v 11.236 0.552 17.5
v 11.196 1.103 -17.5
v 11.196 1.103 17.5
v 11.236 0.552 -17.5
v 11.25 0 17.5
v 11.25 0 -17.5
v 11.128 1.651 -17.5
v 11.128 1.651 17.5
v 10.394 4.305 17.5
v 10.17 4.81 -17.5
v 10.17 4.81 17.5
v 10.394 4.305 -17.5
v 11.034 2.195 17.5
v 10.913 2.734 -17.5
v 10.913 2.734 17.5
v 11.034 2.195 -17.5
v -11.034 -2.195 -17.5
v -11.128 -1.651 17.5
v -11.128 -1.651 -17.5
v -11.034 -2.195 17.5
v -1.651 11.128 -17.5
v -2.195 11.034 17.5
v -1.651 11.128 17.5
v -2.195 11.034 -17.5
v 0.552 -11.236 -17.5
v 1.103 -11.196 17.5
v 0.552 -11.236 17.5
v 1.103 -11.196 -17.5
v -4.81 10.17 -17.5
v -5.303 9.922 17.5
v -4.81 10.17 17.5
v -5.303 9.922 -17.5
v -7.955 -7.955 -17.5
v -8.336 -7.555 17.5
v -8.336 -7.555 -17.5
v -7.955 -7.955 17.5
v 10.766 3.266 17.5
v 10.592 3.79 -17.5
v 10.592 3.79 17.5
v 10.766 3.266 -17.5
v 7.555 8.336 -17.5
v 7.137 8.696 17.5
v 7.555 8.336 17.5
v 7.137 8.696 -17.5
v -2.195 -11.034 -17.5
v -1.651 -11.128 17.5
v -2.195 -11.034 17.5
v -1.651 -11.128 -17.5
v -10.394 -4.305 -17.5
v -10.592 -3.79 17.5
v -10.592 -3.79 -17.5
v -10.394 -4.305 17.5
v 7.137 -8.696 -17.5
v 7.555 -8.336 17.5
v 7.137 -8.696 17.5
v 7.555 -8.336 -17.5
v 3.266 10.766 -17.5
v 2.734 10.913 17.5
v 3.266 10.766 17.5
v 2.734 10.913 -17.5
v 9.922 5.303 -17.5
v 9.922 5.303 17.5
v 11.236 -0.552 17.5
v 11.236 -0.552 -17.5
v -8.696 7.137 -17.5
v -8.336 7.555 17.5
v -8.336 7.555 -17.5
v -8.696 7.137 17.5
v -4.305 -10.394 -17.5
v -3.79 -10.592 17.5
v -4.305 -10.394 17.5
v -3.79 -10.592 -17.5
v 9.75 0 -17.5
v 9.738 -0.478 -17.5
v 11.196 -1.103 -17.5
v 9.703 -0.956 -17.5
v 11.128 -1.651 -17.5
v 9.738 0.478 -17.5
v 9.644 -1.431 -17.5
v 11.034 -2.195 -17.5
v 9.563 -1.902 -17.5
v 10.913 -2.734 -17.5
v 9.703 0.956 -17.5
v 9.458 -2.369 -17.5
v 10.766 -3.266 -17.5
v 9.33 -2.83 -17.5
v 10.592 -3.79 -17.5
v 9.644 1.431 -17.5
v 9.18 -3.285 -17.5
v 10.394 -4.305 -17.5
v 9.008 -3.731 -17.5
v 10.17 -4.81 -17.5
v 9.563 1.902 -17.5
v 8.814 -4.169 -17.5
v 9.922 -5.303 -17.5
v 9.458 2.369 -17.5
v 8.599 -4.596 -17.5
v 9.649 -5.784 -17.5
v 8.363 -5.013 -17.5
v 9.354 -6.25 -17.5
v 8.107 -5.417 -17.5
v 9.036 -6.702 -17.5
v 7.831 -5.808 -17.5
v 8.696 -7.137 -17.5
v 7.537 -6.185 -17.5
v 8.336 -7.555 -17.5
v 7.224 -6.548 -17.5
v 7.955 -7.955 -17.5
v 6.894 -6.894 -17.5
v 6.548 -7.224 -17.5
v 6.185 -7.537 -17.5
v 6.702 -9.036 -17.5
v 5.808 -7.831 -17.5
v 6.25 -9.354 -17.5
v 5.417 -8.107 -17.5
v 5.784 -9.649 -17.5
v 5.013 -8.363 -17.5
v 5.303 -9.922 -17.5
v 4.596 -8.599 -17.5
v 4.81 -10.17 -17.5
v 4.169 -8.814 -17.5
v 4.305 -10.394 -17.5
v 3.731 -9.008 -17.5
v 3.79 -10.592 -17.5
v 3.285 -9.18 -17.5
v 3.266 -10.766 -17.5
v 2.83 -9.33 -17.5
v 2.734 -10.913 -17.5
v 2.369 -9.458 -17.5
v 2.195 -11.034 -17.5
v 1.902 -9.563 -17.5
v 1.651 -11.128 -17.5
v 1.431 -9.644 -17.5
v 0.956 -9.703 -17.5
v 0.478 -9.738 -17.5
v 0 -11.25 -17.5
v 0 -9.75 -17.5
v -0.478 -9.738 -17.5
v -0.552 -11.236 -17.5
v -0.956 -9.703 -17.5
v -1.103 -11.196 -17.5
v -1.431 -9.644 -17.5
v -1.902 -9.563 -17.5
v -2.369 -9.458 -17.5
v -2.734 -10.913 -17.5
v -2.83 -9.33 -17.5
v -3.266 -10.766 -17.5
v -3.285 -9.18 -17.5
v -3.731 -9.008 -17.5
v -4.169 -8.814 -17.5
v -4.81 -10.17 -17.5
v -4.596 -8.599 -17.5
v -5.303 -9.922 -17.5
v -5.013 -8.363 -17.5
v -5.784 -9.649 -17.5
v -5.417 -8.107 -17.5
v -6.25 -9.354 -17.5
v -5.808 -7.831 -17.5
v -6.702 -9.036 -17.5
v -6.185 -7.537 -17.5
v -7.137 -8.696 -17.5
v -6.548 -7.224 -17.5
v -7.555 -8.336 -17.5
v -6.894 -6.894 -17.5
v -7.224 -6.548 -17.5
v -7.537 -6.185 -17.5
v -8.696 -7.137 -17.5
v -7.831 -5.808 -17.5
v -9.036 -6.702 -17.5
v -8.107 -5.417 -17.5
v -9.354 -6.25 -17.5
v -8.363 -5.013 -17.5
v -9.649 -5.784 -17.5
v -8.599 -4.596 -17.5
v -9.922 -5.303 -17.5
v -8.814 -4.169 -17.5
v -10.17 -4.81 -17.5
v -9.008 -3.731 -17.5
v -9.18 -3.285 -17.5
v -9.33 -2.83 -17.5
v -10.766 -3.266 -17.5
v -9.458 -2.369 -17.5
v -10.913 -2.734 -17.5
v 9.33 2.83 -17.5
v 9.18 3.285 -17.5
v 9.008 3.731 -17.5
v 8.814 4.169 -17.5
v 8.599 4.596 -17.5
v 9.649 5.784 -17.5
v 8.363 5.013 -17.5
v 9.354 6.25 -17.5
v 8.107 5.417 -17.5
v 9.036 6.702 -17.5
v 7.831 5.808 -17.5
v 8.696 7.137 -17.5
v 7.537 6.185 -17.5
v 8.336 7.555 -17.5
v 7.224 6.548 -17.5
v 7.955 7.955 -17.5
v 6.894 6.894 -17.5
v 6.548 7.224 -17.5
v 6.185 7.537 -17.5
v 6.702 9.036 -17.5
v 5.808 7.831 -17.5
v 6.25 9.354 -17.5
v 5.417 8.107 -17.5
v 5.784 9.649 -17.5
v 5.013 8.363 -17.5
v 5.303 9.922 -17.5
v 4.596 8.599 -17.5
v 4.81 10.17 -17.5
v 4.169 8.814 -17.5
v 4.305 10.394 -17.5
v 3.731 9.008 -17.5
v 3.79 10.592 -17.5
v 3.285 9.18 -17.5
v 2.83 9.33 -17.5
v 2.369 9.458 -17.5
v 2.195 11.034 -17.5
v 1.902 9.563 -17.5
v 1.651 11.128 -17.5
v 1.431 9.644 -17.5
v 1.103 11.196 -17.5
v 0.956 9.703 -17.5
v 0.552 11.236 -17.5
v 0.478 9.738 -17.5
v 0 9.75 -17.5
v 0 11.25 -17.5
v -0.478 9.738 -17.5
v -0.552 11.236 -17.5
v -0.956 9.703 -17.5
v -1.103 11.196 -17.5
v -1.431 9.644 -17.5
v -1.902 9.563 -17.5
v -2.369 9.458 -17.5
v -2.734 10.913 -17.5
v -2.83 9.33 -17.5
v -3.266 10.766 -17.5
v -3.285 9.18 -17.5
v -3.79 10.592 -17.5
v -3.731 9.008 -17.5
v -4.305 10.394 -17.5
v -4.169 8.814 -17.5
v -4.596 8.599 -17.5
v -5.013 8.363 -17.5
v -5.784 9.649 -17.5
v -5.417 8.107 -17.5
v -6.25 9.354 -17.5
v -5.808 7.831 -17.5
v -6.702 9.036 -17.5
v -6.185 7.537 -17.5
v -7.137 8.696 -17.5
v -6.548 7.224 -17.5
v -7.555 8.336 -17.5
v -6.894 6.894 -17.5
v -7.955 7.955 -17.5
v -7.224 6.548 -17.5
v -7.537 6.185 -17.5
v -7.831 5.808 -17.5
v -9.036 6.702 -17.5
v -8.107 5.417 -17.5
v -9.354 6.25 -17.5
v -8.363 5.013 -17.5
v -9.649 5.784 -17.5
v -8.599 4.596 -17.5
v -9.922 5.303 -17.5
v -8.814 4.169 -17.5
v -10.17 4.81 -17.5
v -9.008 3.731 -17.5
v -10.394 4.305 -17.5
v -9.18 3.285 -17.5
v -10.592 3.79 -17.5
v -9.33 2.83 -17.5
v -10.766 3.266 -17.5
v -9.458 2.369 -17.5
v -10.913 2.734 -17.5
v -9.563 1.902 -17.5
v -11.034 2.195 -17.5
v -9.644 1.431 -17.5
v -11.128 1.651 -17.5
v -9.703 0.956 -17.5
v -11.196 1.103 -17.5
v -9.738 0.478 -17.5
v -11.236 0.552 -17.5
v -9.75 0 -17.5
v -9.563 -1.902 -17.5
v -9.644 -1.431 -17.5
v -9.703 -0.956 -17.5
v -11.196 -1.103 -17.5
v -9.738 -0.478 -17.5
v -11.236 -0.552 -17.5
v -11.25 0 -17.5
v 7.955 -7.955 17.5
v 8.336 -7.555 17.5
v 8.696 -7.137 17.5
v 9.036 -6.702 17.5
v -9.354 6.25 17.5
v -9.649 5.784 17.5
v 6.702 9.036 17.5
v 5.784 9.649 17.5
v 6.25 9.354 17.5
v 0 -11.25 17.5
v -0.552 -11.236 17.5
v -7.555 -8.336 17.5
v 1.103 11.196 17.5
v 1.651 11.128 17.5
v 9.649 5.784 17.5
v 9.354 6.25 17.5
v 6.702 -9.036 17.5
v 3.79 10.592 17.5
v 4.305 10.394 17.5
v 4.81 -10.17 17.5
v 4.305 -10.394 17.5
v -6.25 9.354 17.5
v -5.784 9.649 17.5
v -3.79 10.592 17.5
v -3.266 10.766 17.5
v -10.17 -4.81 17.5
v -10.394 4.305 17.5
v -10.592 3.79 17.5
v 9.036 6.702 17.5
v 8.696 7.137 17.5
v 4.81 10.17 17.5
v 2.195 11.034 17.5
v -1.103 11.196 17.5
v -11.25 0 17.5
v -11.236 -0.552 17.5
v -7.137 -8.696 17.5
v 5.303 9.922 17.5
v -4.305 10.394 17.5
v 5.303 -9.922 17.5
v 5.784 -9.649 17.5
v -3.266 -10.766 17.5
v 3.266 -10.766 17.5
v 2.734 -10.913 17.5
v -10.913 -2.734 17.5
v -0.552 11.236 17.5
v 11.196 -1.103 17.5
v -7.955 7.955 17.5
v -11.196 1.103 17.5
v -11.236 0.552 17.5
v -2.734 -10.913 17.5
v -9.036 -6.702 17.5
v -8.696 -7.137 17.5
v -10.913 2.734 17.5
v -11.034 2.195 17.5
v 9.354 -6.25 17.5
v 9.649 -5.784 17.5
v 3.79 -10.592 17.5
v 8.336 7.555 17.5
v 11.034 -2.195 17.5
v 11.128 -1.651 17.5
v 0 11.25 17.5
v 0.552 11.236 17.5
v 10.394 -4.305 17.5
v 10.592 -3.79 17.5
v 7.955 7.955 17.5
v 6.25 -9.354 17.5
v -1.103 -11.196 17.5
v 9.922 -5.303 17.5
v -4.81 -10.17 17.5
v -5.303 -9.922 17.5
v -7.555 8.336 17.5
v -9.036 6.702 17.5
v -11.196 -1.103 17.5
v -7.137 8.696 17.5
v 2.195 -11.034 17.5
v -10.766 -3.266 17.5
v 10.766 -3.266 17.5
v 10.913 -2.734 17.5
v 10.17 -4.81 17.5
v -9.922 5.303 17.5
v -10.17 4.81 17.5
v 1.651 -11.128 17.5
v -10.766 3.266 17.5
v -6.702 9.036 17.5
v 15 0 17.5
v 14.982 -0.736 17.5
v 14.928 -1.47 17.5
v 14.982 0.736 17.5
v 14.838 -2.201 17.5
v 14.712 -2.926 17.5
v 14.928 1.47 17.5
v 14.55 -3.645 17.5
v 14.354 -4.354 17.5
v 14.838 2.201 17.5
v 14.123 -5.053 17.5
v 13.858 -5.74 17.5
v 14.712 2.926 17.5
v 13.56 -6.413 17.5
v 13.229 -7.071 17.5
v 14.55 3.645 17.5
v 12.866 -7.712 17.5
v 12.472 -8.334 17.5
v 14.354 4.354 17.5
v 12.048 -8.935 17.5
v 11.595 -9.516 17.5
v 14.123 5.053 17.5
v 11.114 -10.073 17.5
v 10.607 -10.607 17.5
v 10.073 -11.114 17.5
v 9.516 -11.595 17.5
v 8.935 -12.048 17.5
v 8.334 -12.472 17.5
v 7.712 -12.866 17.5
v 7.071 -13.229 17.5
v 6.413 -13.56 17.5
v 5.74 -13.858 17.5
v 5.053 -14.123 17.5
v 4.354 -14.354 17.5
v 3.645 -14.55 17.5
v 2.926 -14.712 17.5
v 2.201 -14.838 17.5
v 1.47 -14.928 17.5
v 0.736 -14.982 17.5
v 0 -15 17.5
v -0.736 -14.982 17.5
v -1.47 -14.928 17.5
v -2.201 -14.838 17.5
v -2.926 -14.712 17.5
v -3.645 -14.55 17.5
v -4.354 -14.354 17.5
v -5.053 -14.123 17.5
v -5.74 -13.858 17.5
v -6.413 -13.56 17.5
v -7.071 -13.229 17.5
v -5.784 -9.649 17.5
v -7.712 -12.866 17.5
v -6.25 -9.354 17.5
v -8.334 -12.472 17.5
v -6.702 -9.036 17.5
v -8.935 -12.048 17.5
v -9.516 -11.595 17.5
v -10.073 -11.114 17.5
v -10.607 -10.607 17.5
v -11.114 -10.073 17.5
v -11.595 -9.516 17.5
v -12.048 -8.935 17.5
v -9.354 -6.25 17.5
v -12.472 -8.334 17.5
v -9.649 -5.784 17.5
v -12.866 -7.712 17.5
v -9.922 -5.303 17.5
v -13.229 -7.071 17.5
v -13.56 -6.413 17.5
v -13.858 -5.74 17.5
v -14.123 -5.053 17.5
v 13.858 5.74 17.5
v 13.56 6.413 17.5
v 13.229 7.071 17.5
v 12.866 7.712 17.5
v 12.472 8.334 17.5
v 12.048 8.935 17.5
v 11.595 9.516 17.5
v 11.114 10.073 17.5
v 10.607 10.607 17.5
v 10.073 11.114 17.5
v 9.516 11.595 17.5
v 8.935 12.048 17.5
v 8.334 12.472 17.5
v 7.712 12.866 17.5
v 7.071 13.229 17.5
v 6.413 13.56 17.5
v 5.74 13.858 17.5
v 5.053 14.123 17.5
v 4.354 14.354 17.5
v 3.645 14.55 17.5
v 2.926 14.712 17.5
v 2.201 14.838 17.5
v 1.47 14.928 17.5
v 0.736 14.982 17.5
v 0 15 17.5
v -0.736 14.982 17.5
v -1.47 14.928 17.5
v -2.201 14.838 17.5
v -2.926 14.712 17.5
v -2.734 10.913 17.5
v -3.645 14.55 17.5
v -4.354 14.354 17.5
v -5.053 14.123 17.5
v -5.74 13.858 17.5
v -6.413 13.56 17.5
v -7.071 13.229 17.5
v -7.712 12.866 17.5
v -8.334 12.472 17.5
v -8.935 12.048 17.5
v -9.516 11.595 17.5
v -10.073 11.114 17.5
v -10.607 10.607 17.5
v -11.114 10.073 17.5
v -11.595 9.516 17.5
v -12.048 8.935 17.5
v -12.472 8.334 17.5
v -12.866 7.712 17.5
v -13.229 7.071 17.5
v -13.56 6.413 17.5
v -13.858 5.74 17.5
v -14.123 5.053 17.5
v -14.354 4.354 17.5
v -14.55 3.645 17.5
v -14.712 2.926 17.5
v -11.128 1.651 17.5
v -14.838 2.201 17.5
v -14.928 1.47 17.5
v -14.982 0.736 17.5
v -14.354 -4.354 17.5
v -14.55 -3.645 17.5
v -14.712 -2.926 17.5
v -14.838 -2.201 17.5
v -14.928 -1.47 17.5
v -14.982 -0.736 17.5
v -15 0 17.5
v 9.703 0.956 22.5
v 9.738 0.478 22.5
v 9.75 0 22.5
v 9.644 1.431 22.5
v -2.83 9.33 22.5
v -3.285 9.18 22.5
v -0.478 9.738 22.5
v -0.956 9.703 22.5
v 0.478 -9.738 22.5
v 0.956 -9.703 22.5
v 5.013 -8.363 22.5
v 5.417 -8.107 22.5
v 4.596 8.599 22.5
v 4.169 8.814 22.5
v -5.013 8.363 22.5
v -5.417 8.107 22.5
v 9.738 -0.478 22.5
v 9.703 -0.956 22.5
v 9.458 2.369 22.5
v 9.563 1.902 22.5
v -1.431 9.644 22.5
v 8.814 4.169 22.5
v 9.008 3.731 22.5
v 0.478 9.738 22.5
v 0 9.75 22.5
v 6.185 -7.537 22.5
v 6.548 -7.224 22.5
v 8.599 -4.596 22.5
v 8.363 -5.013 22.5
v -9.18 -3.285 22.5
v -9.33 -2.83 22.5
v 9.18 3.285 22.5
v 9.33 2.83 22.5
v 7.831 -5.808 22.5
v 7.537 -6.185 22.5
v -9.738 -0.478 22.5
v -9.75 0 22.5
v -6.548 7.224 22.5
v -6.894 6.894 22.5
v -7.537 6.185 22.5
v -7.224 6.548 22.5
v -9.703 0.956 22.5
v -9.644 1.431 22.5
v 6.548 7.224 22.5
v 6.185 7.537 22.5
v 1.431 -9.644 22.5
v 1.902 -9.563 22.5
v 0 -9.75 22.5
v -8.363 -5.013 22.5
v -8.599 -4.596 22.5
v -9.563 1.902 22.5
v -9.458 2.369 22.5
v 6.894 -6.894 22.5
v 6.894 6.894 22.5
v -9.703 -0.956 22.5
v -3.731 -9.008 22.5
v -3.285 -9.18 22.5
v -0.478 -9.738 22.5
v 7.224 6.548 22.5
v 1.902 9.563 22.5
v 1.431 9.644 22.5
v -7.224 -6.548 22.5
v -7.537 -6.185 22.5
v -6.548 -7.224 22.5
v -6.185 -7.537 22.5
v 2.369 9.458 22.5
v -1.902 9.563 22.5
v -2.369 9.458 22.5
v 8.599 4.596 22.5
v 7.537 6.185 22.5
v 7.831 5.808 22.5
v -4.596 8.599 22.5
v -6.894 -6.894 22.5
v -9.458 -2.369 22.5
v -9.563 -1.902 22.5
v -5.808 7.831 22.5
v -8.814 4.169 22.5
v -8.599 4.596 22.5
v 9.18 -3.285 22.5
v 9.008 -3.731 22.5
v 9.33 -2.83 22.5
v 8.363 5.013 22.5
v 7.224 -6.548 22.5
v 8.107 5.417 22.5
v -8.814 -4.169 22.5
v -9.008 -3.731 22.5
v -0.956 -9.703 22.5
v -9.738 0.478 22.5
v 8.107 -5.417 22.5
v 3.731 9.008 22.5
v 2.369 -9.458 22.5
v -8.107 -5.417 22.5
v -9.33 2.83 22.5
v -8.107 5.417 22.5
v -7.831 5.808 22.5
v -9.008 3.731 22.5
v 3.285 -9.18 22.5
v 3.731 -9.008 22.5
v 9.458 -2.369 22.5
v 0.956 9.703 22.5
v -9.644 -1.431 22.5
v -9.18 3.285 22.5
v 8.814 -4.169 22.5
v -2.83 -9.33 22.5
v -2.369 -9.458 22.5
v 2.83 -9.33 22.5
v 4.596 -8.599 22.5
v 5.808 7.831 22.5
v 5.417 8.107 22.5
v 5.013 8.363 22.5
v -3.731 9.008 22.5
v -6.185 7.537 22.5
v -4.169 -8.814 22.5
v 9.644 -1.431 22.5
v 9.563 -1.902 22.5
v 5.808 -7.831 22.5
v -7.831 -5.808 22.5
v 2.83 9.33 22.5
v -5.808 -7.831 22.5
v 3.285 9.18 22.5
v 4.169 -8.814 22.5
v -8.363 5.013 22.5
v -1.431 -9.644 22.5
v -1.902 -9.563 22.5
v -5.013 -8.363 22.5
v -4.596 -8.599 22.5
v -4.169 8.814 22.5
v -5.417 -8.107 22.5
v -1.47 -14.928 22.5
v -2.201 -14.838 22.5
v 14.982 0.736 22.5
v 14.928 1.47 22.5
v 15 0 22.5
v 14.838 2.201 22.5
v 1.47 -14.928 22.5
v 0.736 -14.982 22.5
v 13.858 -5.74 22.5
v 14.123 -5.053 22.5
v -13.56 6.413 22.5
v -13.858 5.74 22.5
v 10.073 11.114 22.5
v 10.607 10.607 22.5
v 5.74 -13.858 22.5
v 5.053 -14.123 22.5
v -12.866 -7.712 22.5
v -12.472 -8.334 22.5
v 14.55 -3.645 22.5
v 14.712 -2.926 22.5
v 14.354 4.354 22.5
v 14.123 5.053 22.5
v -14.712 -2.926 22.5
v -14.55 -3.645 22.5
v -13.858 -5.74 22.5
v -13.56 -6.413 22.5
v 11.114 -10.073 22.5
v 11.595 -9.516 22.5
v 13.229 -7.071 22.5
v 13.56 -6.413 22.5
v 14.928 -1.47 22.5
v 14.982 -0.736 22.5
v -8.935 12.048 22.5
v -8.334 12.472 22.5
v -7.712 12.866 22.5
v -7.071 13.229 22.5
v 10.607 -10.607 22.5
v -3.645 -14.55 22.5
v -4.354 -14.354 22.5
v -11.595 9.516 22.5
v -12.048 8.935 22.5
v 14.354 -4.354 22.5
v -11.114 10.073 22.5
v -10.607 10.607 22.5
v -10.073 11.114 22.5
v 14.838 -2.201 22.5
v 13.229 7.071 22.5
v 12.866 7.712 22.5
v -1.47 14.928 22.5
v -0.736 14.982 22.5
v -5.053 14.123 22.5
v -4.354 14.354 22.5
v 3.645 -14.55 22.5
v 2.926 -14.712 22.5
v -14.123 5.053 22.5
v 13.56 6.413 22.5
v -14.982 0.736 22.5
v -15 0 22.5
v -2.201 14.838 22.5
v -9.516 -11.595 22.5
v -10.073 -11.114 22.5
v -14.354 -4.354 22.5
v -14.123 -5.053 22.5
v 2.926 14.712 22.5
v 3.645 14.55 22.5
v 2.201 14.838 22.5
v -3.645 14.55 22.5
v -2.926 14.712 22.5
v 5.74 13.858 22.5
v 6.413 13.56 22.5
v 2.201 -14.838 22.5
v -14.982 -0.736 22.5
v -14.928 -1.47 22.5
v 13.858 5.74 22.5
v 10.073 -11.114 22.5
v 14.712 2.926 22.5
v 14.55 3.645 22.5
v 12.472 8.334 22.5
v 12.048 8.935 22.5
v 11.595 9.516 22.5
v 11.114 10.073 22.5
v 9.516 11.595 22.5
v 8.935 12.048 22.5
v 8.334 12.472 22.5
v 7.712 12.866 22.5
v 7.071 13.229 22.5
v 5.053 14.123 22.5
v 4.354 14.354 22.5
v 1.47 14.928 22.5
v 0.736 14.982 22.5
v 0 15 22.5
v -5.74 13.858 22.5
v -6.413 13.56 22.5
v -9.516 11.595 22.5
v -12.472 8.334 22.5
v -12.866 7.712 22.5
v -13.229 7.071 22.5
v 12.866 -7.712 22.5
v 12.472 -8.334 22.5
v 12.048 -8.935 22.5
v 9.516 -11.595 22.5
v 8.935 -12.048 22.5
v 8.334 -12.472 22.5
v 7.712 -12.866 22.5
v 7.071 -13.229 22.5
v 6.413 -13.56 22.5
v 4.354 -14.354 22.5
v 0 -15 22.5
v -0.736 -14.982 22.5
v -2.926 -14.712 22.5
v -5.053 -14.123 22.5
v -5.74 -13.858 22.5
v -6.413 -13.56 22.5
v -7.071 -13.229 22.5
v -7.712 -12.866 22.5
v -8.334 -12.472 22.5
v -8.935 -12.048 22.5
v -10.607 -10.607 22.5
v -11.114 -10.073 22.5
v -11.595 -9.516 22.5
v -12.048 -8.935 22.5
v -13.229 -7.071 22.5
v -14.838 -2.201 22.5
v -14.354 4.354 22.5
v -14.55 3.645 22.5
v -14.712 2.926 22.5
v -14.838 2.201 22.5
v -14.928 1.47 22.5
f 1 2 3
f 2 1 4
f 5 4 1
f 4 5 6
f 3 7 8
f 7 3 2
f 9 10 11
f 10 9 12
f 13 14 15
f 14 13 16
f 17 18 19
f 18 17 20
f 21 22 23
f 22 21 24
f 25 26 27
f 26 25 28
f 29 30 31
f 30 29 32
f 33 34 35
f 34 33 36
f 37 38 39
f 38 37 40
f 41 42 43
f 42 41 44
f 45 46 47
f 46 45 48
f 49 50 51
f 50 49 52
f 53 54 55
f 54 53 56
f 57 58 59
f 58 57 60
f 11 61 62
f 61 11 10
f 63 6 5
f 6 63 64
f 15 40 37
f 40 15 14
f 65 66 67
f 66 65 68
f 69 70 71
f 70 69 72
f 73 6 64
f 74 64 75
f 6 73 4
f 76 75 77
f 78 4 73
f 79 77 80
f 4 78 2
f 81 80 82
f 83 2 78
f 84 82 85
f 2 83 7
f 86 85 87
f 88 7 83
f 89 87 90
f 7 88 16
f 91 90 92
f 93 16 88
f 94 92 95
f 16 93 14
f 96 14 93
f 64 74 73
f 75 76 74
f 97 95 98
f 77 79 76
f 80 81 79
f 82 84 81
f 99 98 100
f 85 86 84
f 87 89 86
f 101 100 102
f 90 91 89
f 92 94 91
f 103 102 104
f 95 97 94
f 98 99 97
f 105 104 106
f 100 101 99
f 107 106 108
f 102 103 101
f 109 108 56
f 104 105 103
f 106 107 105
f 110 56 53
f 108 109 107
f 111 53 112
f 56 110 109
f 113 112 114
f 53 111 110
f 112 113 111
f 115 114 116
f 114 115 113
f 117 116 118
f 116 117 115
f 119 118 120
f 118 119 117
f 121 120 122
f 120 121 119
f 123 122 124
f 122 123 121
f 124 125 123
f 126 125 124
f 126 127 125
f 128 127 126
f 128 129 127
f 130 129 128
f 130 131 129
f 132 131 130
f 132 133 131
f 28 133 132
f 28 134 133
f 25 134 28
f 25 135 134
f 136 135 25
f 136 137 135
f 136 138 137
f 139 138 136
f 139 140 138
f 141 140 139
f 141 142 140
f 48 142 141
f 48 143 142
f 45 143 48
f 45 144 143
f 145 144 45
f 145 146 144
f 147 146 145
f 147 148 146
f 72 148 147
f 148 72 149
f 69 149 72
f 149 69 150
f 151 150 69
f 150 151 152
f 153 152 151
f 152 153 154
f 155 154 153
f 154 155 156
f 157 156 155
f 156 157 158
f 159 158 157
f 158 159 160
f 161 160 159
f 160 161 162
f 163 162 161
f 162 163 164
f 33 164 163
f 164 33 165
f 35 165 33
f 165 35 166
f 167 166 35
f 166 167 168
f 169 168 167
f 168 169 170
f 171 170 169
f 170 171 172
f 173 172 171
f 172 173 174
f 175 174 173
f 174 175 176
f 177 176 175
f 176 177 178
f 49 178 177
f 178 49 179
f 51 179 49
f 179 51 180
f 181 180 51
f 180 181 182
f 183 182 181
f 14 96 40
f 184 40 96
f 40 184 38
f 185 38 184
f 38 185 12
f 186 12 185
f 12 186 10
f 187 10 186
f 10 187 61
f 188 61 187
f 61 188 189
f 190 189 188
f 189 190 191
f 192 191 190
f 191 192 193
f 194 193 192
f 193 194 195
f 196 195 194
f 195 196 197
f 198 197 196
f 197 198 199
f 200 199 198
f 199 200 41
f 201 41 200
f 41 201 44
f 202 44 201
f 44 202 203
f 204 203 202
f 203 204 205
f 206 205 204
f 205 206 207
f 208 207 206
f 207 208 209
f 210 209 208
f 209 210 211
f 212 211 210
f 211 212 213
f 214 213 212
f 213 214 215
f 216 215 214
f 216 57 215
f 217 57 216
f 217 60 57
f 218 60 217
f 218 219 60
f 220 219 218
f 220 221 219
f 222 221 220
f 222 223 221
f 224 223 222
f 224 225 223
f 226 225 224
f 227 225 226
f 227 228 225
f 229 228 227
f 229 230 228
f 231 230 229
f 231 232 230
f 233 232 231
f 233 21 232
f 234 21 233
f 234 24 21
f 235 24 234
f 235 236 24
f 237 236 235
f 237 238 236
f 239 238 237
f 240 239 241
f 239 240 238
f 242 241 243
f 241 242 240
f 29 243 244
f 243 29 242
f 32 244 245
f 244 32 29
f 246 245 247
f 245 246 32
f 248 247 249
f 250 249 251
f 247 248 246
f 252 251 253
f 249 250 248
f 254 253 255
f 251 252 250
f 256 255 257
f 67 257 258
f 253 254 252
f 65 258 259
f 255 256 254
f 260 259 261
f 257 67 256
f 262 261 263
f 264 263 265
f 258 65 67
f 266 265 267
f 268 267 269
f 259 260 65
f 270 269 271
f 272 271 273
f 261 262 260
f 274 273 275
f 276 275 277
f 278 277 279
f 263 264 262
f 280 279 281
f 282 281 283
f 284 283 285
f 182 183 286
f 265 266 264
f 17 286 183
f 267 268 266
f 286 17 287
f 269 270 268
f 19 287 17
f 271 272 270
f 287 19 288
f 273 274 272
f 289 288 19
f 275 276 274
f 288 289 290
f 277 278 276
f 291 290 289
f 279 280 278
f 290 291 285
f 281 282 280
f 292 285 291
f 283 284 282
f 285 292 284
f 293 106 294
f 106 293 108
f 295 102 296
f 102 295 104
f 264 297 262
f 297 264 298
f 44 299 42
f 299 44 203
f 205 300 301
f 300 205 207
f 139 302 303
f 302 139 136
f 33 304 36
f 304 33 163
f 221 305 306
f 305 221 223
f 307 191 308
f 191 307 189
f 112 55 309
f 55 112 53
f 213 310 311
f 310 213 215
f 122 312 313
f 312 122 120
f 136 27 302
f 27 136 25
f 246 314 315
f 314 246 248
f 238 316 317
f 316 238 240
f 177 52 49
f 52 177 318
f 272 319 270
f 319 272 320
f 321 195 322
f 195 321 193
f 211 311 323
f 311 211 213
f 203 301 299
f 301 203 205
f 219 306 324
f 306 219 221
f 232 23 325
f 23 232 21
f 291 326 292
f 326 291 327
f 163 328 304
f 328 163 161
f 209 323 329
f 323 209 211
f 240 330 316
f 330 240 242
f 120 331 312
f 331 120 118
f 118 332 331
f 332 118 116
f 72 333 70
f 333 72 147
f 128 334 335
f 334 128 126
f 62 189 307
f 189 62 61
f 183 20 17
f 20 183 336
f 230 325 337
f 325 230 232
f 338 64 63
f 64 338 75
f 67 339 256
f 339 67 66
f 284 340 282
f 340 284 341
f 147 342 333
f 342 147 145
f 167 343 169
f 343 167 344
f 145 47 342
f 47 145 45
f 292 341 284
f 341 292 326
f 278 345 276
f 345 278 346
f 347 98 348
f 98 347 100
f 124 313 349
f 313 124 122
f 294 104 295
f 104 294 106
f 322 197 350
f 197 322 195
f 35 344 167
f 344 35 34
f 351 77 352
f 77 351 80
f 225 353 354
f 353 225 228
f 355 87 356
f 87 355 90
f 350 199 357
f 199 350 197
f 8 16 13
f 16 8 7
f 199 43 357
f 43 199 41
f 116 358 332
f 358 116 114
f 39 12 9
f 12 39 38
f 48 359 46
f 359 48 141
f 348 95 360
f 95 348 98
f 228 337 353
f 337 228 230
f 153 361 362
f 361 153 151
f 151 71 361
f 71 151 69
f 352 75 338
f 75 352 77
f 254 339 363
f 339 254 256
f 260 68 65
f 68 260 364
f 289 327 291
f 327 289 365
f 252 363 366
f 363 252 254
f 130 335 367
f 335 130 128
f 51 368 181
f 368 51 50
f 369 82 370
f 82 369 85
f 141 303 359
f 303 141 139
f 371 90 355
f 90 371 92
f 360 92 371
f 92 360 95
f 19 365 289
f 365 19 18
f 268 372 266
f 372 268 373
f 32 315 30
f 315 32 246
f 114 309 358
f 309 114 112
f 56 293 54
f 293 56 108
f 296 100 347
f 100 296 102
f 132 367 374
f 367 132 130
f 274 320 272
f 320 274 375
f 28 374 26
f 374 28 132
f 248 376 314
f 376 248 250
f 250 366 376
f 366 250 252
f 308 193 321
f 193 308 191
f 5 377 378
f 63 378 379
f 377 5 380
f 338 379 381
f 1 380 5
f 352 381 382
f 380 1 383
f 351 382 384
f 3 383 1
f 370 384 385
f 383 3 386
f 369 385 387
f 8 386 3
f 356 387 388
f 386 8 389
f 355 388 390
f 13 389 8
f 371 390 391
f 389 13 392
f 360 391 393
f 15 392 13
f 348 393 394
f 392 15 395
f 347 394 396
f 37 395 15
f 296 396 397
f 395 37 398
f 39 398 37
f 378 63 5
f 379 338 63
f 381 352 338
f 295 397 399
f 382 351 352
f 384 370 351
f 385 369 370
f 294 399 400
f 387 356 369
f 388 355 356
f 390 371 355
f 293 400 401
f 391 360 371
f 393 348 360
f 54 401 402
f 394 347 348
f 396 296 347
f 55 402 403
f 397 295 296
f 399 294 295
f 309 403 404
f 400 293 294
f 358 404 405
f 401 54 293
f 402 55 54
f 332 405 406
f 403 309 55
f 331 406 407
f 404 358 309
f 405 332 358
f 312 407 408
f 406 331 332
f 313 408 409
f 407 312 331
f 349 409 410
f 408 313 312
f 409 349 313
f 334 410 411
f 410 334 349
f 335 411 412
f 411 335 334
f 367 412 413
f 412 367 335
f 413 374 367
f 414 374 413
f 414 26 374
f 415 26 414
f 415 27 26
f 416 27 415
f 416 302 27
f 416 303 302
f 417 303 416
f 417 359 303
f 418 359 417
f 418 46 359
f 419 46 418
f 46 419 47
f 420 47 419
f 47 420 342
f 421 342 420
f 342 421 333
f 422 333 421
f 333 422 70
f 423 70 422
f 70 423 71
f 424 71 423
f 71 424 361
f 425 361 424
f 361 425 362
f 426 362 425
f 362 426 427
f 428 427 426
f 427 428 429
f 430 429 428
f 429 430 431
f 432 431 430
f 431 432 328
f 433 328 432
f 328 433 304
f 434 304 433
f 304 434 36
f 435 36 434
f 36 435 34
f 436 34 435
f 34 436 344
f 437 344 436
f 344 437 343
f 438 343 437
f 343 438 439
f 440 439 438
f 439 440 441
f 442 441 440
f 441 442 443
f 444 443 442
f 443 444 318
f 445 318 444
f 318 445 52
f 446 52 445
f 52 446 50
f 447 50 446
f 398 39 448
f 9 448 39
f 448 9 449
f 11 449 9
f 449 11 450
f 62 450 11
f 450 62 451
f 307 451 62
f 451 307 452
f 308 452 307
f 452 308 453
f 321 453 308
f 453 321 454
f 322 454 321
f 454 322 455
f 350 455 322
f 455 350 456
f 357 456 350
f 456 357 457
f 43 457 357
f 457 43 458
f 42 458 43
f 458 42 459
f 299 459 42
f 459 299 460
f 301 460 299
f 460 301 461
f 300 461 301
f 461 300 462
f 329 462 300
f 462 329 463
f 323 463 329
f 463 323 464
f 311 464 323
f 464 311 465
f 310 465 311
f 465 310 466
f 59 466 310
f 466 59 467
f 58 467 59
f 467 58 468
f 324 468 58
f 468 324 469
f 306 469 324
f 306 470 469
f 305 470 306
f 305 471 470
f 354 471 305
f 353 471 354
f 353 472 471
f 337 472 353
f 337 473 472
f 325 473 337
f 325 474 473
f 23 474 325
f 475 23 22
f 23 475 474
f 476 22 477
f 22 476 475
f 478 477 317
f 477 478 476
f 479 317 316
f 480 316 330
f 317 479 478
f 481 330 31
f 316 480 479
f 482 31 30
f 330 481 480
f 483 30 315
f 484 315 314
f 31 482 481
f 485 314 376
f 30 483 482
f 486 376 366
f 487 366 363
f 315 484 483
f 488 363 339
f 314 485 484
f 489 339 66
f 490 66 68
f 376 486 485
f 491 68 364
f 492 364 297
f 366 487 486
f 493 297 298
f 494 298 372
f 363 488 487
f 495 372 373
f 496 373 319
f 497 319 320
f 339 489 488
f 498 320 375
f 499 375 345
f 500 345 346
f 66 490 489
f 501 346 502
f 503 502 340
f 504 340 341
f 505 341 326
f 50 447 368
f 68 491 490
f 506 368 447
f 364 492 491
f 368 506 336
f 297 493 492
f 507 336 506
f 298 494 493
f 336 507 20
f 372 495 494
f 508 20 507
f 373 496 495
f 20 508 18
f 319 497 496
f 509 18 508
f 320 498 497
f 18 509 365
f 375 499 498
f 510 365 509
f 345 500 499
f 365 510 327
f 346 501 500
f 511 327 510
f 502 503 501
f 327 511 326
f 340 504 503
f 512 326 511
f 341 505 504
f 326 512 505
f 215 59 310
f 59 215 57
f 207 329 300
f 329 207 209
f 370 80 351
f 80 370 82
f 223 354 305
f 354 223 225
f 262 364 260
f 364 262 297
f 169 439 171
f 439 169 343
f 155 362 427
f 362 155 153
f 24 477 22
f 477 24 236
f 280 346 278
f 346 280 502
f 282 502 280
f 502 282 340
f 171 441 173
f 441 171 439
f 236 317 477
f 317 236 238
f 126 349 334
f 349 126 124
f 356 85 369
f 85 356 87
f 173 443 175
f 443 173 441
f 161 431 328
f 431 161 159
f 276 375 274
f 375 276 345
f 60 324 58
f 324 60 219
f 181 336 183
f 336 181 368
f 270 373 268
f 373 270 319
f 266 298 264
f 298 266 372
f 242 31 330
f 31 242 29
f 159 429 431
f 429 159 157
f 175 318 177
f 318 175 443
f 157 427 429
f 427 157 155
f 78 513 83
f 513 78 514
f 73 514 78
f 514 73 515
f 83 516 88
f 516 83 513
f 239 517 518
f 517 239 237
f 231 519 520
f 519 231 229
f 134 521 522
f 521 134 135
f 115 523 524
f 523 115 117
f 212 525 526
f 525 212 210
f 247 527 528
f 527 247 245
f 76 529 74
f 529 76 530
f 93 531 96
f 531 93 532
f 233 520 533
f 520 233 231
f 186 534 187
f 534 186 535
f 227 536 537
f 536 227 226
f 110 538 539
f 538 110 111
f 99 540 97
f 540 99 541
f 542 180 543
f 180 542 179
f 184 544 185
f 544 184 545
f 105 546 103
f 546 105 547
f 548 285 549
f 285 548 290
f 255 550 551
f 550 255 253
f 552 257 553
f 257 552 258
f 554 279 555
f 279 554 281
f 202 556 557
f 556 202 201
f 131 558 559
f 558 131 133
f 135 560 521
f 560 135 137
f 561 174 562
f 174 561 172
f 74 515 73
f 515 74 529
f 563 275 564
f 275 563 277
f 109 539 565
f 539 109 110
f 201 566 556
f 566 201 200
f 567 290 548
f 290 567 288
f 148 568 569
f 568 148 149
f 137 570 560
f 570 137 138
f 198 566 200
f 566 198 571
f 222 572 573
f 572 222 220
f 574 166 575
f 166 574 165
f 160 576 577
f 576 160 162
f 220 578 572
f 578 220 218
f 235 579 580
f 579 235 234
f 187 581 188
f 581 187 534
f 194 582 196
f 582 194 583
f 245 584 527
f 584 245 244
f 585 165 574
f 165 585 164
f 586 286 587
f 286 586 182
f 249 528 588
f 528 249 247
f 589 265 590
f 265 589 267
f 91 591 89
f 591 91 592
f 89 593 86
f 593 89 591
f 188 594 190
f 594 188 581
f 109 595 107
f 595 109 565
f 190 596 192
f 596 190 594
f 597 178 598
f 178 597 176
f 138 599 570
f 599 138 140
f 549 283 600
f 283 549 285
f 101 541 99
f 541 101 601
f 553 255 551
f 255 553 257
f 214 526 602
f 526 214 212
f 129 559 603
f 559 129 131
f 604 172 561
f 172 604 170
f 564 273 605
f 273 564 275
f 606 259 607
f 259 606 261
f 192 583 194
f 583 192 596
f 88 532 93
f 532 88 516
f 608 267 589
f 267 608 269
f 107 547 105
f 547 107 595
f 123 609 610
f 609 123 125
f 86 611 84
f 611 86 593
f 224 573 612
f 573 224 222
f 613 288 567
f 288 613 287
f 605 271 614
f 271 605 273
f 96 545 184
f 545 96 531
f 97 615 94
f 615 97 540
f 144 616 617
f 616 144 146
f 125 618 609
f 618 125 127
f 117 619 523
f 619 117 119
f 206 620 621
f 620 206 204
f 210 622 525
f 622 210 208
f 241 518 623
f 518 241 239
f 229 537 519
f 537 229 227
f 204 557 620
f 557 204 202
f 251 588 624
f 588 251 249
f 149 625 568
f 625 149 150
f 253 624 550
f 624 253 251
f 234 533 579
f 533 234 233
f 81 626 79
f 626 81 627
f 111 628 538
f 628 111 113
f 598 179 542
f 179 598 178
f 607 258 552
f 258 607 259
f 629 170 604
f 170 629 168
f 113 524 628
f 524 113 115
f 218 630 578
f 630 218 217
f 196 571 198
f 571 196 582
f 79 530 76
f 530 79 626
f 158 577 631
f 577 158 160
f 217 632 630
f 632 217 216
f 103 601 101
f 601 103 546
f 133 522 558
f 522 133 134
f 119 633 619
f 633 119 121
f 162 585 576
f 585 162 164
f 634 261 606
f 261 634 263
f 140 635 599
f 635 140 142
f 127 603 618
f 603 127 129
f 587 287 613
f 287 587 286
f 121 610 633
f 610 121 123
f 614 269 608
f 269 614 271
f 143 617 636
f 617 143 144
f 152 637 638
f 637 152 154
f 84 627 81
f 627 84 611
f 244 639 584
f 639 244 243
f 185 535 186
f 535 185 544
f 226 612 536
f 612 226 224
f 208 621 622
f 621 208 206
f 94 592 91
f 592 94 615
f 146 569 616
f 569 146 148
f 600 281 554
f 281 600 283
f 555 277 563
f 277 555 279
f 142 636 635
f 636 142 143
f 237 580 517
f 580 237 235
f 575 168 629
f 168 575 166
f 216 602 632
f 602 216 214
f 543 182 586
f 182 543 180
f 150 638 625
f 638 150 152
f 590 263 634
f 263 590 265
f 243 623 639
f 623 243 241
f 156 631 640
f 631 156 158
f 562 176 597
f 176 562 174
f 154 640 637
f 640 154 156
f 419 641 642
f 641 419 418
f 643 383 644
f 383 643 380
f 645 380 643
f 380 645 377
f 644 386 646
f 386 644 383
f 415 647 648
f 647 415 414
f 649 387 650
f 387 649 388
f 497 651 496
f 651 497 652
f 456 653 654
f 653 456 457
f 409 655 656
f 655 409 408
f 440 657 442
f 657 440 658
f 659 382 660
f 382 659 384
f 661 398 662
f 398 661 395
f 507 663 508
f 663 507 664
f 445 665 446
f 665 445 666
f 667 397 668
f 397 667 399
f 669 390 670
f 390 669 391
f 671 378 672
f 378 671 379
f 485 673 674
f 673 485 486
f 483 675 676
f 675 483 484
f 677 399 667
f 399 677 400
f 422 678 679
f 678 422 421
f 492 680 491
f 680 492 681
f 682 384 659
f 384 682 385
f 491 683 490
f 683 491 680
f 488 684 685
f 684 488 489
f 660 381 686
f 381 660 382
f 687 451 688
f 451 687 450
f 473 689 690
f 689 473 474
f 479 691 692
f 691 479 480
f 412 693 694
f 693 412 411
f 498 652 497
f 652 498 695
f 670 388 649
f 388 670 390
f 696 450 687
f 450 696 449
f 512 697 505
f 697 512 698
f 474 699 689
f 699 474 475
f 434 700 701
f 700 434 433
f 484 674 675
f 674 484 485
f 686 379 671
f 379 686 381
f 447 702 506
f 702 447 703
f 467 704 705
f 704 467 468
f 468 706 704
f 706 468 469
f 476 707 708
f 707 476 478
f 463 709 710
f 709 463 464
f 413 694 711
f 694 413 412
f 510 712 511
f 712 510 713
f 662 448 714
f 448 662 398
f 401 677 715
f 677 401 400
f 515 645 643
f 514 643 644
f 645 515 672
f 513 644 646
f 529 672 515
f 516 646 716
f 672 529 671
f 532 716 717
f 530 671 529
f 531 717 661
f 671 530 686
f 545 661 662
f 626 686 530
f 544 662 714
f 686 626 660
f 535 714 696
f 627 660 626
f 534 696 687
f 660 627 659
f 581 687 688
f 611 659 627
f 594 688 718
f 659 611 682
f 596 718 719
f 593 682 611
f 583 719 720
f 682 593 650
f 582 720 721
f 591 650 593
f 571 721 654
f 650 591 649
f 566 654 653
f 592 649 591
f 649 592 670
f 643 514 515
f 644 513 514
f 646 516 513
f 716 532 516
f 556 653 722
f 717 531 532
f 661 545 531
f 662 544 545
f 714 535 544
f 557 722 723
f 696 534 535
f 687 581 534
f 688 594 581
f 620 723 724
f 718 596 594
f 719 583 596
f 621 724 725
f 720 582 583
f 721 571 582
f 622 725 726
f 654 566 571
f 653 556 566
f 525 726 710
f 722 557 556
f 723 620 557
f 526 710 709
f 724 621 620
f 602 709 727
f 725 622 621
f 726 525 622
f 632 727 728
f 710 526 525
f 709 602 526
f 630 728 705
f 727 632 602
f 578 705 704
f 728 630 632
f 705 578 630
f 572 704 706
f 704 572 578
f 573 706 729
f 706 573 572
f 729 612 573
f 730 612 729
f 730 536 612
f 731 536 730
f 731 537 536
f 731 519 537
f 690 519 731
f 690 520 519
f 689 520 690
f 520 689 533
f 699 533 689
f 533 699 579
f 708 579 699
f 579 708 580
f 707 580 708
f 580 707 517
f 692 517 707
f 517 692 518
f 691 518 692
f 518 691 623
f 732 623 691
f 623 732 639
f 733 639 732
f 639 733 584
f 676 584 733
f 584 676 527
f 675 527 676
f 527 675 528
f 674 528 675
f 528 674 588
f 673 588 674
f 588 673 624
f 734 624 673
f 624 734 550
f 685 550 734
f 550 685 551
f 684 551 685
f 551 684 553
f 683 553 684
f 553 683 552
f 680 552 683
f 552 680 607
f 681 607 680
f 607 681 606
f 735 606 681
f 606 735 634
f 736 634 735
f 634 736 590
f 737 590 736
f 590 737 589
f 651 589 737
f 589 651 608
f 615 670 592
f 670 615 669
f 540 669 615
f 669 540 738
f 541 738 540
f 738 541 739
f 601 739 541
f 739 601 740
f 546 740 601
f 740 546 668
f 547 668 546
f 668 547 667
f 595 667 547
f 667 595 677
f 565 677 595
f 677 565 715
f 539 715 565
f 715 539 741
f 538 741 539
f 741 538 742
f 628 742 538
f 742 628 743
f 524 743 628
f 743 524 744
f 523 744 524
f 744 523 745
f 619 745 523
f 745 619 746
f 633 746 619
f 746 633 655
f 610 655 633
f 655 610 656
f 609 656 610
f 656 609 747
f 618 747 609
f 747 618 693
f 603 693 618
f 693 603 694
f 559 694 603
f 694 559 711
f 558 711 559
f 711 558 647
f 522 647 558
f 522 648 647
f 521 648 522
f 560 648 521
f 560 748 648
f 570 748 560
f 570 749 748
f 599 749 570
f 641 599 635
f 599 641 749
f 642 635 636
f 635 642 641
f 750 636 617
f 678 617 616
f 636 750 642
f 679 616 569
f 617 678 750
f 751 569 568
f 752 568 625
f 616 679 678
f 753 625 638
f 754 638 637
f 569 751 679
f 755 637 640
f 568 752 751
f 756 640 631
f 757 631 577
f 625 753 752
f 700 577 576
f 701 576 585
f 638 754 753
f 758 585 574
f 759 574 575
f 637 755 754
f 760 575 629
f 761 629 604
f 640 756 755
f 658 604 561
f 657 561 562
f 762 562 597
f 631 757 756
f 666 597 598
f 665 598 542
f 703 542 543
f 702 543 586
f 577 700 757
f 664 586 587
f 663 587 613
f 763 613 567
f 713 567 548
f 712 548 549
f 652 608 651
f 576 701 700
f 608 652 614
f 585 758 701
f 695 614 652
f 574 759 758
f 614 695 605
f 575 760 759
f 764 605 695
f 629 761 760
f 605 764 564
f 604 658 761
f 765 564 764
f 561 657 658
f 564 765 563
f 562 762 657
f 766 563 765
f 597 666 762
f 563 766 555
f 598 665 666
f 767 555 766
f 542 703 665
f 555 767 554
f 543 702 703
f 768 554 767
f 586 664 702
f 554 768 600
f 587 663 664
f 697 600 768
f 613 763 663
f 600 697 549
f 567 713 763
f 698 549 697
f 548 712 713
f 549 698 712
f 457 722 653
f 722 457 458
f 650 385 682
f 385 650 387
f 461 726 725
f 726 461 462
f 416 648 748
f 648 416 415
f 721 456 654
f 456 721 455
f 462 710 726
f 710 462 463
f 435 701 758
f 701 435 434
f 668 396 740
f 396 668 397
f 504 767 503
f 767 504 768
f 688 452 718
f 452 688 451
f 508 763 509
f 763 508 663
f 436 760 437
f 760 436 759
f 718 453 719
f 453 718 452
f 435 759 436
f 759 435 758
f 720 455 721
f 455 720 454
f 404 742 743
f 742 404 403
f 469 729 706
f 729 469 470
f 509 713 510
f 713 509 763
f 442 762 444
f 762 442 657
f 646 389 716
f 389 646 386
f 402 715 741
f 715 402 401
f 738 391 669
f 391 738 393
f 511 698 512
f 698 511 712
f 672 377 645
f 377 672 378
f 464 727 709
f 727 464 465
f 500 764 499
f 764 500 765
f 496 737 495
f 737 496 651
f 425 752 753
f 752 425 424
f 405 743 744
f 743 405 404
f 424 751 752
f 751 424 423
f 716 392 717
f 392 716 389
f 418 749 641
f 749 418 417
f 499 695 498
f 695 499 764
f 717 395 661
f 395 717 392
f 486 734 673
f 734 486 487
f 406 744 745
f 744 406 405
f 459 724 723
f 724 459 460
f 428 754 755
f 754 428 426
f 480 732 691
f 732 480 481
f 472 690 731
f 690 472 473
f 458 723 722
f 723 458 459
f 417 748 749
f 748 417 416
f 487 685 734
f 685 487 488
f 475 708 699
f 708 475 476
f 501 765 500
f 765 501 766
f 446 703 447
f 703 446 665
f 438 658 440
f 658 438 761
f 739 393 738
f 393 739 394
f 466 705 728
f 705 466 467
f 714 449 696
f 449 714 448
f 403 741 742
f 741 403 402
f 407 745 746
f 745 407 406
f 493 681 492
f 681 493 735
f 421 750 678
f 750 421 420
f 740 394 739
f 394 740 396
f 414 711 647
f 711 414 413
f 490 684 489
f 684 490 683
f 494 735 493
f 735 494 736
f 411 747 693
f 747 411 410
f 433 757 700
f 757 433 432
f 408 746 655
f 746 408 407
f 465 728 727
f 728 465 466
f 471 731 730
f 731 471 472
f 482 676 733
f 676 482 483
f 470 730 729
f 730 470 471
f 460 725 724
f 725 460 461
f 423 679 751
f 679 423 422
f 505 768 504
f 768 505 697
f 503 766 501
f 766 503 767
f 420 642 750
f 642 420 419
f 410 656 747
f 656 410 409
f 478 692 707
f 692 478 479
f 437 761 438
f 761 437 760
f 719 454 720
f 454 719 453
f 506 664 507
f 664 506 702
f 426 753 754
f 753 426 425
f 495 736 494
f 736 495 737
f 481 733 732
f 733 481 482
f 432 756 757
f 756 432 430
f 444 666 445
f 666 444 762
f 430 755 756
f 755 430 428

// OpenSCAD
echo("Работа Горбуновой Арины!");
$fn = 128;

ocular();
translate([0, 0, 35/2+5/2])
top();

module top() {
    difference() {
    cylinder(d=30, h=5, center=true);
    cylinder(d=23-0.5-3, h=15, center=true);
    }
  }

module ocular() {
difference() {
    cylinder(d=23-0.5, h=35,  center=true);
    cylinder(d=23-0.5-3, h=40,  center=true);
  }
}
